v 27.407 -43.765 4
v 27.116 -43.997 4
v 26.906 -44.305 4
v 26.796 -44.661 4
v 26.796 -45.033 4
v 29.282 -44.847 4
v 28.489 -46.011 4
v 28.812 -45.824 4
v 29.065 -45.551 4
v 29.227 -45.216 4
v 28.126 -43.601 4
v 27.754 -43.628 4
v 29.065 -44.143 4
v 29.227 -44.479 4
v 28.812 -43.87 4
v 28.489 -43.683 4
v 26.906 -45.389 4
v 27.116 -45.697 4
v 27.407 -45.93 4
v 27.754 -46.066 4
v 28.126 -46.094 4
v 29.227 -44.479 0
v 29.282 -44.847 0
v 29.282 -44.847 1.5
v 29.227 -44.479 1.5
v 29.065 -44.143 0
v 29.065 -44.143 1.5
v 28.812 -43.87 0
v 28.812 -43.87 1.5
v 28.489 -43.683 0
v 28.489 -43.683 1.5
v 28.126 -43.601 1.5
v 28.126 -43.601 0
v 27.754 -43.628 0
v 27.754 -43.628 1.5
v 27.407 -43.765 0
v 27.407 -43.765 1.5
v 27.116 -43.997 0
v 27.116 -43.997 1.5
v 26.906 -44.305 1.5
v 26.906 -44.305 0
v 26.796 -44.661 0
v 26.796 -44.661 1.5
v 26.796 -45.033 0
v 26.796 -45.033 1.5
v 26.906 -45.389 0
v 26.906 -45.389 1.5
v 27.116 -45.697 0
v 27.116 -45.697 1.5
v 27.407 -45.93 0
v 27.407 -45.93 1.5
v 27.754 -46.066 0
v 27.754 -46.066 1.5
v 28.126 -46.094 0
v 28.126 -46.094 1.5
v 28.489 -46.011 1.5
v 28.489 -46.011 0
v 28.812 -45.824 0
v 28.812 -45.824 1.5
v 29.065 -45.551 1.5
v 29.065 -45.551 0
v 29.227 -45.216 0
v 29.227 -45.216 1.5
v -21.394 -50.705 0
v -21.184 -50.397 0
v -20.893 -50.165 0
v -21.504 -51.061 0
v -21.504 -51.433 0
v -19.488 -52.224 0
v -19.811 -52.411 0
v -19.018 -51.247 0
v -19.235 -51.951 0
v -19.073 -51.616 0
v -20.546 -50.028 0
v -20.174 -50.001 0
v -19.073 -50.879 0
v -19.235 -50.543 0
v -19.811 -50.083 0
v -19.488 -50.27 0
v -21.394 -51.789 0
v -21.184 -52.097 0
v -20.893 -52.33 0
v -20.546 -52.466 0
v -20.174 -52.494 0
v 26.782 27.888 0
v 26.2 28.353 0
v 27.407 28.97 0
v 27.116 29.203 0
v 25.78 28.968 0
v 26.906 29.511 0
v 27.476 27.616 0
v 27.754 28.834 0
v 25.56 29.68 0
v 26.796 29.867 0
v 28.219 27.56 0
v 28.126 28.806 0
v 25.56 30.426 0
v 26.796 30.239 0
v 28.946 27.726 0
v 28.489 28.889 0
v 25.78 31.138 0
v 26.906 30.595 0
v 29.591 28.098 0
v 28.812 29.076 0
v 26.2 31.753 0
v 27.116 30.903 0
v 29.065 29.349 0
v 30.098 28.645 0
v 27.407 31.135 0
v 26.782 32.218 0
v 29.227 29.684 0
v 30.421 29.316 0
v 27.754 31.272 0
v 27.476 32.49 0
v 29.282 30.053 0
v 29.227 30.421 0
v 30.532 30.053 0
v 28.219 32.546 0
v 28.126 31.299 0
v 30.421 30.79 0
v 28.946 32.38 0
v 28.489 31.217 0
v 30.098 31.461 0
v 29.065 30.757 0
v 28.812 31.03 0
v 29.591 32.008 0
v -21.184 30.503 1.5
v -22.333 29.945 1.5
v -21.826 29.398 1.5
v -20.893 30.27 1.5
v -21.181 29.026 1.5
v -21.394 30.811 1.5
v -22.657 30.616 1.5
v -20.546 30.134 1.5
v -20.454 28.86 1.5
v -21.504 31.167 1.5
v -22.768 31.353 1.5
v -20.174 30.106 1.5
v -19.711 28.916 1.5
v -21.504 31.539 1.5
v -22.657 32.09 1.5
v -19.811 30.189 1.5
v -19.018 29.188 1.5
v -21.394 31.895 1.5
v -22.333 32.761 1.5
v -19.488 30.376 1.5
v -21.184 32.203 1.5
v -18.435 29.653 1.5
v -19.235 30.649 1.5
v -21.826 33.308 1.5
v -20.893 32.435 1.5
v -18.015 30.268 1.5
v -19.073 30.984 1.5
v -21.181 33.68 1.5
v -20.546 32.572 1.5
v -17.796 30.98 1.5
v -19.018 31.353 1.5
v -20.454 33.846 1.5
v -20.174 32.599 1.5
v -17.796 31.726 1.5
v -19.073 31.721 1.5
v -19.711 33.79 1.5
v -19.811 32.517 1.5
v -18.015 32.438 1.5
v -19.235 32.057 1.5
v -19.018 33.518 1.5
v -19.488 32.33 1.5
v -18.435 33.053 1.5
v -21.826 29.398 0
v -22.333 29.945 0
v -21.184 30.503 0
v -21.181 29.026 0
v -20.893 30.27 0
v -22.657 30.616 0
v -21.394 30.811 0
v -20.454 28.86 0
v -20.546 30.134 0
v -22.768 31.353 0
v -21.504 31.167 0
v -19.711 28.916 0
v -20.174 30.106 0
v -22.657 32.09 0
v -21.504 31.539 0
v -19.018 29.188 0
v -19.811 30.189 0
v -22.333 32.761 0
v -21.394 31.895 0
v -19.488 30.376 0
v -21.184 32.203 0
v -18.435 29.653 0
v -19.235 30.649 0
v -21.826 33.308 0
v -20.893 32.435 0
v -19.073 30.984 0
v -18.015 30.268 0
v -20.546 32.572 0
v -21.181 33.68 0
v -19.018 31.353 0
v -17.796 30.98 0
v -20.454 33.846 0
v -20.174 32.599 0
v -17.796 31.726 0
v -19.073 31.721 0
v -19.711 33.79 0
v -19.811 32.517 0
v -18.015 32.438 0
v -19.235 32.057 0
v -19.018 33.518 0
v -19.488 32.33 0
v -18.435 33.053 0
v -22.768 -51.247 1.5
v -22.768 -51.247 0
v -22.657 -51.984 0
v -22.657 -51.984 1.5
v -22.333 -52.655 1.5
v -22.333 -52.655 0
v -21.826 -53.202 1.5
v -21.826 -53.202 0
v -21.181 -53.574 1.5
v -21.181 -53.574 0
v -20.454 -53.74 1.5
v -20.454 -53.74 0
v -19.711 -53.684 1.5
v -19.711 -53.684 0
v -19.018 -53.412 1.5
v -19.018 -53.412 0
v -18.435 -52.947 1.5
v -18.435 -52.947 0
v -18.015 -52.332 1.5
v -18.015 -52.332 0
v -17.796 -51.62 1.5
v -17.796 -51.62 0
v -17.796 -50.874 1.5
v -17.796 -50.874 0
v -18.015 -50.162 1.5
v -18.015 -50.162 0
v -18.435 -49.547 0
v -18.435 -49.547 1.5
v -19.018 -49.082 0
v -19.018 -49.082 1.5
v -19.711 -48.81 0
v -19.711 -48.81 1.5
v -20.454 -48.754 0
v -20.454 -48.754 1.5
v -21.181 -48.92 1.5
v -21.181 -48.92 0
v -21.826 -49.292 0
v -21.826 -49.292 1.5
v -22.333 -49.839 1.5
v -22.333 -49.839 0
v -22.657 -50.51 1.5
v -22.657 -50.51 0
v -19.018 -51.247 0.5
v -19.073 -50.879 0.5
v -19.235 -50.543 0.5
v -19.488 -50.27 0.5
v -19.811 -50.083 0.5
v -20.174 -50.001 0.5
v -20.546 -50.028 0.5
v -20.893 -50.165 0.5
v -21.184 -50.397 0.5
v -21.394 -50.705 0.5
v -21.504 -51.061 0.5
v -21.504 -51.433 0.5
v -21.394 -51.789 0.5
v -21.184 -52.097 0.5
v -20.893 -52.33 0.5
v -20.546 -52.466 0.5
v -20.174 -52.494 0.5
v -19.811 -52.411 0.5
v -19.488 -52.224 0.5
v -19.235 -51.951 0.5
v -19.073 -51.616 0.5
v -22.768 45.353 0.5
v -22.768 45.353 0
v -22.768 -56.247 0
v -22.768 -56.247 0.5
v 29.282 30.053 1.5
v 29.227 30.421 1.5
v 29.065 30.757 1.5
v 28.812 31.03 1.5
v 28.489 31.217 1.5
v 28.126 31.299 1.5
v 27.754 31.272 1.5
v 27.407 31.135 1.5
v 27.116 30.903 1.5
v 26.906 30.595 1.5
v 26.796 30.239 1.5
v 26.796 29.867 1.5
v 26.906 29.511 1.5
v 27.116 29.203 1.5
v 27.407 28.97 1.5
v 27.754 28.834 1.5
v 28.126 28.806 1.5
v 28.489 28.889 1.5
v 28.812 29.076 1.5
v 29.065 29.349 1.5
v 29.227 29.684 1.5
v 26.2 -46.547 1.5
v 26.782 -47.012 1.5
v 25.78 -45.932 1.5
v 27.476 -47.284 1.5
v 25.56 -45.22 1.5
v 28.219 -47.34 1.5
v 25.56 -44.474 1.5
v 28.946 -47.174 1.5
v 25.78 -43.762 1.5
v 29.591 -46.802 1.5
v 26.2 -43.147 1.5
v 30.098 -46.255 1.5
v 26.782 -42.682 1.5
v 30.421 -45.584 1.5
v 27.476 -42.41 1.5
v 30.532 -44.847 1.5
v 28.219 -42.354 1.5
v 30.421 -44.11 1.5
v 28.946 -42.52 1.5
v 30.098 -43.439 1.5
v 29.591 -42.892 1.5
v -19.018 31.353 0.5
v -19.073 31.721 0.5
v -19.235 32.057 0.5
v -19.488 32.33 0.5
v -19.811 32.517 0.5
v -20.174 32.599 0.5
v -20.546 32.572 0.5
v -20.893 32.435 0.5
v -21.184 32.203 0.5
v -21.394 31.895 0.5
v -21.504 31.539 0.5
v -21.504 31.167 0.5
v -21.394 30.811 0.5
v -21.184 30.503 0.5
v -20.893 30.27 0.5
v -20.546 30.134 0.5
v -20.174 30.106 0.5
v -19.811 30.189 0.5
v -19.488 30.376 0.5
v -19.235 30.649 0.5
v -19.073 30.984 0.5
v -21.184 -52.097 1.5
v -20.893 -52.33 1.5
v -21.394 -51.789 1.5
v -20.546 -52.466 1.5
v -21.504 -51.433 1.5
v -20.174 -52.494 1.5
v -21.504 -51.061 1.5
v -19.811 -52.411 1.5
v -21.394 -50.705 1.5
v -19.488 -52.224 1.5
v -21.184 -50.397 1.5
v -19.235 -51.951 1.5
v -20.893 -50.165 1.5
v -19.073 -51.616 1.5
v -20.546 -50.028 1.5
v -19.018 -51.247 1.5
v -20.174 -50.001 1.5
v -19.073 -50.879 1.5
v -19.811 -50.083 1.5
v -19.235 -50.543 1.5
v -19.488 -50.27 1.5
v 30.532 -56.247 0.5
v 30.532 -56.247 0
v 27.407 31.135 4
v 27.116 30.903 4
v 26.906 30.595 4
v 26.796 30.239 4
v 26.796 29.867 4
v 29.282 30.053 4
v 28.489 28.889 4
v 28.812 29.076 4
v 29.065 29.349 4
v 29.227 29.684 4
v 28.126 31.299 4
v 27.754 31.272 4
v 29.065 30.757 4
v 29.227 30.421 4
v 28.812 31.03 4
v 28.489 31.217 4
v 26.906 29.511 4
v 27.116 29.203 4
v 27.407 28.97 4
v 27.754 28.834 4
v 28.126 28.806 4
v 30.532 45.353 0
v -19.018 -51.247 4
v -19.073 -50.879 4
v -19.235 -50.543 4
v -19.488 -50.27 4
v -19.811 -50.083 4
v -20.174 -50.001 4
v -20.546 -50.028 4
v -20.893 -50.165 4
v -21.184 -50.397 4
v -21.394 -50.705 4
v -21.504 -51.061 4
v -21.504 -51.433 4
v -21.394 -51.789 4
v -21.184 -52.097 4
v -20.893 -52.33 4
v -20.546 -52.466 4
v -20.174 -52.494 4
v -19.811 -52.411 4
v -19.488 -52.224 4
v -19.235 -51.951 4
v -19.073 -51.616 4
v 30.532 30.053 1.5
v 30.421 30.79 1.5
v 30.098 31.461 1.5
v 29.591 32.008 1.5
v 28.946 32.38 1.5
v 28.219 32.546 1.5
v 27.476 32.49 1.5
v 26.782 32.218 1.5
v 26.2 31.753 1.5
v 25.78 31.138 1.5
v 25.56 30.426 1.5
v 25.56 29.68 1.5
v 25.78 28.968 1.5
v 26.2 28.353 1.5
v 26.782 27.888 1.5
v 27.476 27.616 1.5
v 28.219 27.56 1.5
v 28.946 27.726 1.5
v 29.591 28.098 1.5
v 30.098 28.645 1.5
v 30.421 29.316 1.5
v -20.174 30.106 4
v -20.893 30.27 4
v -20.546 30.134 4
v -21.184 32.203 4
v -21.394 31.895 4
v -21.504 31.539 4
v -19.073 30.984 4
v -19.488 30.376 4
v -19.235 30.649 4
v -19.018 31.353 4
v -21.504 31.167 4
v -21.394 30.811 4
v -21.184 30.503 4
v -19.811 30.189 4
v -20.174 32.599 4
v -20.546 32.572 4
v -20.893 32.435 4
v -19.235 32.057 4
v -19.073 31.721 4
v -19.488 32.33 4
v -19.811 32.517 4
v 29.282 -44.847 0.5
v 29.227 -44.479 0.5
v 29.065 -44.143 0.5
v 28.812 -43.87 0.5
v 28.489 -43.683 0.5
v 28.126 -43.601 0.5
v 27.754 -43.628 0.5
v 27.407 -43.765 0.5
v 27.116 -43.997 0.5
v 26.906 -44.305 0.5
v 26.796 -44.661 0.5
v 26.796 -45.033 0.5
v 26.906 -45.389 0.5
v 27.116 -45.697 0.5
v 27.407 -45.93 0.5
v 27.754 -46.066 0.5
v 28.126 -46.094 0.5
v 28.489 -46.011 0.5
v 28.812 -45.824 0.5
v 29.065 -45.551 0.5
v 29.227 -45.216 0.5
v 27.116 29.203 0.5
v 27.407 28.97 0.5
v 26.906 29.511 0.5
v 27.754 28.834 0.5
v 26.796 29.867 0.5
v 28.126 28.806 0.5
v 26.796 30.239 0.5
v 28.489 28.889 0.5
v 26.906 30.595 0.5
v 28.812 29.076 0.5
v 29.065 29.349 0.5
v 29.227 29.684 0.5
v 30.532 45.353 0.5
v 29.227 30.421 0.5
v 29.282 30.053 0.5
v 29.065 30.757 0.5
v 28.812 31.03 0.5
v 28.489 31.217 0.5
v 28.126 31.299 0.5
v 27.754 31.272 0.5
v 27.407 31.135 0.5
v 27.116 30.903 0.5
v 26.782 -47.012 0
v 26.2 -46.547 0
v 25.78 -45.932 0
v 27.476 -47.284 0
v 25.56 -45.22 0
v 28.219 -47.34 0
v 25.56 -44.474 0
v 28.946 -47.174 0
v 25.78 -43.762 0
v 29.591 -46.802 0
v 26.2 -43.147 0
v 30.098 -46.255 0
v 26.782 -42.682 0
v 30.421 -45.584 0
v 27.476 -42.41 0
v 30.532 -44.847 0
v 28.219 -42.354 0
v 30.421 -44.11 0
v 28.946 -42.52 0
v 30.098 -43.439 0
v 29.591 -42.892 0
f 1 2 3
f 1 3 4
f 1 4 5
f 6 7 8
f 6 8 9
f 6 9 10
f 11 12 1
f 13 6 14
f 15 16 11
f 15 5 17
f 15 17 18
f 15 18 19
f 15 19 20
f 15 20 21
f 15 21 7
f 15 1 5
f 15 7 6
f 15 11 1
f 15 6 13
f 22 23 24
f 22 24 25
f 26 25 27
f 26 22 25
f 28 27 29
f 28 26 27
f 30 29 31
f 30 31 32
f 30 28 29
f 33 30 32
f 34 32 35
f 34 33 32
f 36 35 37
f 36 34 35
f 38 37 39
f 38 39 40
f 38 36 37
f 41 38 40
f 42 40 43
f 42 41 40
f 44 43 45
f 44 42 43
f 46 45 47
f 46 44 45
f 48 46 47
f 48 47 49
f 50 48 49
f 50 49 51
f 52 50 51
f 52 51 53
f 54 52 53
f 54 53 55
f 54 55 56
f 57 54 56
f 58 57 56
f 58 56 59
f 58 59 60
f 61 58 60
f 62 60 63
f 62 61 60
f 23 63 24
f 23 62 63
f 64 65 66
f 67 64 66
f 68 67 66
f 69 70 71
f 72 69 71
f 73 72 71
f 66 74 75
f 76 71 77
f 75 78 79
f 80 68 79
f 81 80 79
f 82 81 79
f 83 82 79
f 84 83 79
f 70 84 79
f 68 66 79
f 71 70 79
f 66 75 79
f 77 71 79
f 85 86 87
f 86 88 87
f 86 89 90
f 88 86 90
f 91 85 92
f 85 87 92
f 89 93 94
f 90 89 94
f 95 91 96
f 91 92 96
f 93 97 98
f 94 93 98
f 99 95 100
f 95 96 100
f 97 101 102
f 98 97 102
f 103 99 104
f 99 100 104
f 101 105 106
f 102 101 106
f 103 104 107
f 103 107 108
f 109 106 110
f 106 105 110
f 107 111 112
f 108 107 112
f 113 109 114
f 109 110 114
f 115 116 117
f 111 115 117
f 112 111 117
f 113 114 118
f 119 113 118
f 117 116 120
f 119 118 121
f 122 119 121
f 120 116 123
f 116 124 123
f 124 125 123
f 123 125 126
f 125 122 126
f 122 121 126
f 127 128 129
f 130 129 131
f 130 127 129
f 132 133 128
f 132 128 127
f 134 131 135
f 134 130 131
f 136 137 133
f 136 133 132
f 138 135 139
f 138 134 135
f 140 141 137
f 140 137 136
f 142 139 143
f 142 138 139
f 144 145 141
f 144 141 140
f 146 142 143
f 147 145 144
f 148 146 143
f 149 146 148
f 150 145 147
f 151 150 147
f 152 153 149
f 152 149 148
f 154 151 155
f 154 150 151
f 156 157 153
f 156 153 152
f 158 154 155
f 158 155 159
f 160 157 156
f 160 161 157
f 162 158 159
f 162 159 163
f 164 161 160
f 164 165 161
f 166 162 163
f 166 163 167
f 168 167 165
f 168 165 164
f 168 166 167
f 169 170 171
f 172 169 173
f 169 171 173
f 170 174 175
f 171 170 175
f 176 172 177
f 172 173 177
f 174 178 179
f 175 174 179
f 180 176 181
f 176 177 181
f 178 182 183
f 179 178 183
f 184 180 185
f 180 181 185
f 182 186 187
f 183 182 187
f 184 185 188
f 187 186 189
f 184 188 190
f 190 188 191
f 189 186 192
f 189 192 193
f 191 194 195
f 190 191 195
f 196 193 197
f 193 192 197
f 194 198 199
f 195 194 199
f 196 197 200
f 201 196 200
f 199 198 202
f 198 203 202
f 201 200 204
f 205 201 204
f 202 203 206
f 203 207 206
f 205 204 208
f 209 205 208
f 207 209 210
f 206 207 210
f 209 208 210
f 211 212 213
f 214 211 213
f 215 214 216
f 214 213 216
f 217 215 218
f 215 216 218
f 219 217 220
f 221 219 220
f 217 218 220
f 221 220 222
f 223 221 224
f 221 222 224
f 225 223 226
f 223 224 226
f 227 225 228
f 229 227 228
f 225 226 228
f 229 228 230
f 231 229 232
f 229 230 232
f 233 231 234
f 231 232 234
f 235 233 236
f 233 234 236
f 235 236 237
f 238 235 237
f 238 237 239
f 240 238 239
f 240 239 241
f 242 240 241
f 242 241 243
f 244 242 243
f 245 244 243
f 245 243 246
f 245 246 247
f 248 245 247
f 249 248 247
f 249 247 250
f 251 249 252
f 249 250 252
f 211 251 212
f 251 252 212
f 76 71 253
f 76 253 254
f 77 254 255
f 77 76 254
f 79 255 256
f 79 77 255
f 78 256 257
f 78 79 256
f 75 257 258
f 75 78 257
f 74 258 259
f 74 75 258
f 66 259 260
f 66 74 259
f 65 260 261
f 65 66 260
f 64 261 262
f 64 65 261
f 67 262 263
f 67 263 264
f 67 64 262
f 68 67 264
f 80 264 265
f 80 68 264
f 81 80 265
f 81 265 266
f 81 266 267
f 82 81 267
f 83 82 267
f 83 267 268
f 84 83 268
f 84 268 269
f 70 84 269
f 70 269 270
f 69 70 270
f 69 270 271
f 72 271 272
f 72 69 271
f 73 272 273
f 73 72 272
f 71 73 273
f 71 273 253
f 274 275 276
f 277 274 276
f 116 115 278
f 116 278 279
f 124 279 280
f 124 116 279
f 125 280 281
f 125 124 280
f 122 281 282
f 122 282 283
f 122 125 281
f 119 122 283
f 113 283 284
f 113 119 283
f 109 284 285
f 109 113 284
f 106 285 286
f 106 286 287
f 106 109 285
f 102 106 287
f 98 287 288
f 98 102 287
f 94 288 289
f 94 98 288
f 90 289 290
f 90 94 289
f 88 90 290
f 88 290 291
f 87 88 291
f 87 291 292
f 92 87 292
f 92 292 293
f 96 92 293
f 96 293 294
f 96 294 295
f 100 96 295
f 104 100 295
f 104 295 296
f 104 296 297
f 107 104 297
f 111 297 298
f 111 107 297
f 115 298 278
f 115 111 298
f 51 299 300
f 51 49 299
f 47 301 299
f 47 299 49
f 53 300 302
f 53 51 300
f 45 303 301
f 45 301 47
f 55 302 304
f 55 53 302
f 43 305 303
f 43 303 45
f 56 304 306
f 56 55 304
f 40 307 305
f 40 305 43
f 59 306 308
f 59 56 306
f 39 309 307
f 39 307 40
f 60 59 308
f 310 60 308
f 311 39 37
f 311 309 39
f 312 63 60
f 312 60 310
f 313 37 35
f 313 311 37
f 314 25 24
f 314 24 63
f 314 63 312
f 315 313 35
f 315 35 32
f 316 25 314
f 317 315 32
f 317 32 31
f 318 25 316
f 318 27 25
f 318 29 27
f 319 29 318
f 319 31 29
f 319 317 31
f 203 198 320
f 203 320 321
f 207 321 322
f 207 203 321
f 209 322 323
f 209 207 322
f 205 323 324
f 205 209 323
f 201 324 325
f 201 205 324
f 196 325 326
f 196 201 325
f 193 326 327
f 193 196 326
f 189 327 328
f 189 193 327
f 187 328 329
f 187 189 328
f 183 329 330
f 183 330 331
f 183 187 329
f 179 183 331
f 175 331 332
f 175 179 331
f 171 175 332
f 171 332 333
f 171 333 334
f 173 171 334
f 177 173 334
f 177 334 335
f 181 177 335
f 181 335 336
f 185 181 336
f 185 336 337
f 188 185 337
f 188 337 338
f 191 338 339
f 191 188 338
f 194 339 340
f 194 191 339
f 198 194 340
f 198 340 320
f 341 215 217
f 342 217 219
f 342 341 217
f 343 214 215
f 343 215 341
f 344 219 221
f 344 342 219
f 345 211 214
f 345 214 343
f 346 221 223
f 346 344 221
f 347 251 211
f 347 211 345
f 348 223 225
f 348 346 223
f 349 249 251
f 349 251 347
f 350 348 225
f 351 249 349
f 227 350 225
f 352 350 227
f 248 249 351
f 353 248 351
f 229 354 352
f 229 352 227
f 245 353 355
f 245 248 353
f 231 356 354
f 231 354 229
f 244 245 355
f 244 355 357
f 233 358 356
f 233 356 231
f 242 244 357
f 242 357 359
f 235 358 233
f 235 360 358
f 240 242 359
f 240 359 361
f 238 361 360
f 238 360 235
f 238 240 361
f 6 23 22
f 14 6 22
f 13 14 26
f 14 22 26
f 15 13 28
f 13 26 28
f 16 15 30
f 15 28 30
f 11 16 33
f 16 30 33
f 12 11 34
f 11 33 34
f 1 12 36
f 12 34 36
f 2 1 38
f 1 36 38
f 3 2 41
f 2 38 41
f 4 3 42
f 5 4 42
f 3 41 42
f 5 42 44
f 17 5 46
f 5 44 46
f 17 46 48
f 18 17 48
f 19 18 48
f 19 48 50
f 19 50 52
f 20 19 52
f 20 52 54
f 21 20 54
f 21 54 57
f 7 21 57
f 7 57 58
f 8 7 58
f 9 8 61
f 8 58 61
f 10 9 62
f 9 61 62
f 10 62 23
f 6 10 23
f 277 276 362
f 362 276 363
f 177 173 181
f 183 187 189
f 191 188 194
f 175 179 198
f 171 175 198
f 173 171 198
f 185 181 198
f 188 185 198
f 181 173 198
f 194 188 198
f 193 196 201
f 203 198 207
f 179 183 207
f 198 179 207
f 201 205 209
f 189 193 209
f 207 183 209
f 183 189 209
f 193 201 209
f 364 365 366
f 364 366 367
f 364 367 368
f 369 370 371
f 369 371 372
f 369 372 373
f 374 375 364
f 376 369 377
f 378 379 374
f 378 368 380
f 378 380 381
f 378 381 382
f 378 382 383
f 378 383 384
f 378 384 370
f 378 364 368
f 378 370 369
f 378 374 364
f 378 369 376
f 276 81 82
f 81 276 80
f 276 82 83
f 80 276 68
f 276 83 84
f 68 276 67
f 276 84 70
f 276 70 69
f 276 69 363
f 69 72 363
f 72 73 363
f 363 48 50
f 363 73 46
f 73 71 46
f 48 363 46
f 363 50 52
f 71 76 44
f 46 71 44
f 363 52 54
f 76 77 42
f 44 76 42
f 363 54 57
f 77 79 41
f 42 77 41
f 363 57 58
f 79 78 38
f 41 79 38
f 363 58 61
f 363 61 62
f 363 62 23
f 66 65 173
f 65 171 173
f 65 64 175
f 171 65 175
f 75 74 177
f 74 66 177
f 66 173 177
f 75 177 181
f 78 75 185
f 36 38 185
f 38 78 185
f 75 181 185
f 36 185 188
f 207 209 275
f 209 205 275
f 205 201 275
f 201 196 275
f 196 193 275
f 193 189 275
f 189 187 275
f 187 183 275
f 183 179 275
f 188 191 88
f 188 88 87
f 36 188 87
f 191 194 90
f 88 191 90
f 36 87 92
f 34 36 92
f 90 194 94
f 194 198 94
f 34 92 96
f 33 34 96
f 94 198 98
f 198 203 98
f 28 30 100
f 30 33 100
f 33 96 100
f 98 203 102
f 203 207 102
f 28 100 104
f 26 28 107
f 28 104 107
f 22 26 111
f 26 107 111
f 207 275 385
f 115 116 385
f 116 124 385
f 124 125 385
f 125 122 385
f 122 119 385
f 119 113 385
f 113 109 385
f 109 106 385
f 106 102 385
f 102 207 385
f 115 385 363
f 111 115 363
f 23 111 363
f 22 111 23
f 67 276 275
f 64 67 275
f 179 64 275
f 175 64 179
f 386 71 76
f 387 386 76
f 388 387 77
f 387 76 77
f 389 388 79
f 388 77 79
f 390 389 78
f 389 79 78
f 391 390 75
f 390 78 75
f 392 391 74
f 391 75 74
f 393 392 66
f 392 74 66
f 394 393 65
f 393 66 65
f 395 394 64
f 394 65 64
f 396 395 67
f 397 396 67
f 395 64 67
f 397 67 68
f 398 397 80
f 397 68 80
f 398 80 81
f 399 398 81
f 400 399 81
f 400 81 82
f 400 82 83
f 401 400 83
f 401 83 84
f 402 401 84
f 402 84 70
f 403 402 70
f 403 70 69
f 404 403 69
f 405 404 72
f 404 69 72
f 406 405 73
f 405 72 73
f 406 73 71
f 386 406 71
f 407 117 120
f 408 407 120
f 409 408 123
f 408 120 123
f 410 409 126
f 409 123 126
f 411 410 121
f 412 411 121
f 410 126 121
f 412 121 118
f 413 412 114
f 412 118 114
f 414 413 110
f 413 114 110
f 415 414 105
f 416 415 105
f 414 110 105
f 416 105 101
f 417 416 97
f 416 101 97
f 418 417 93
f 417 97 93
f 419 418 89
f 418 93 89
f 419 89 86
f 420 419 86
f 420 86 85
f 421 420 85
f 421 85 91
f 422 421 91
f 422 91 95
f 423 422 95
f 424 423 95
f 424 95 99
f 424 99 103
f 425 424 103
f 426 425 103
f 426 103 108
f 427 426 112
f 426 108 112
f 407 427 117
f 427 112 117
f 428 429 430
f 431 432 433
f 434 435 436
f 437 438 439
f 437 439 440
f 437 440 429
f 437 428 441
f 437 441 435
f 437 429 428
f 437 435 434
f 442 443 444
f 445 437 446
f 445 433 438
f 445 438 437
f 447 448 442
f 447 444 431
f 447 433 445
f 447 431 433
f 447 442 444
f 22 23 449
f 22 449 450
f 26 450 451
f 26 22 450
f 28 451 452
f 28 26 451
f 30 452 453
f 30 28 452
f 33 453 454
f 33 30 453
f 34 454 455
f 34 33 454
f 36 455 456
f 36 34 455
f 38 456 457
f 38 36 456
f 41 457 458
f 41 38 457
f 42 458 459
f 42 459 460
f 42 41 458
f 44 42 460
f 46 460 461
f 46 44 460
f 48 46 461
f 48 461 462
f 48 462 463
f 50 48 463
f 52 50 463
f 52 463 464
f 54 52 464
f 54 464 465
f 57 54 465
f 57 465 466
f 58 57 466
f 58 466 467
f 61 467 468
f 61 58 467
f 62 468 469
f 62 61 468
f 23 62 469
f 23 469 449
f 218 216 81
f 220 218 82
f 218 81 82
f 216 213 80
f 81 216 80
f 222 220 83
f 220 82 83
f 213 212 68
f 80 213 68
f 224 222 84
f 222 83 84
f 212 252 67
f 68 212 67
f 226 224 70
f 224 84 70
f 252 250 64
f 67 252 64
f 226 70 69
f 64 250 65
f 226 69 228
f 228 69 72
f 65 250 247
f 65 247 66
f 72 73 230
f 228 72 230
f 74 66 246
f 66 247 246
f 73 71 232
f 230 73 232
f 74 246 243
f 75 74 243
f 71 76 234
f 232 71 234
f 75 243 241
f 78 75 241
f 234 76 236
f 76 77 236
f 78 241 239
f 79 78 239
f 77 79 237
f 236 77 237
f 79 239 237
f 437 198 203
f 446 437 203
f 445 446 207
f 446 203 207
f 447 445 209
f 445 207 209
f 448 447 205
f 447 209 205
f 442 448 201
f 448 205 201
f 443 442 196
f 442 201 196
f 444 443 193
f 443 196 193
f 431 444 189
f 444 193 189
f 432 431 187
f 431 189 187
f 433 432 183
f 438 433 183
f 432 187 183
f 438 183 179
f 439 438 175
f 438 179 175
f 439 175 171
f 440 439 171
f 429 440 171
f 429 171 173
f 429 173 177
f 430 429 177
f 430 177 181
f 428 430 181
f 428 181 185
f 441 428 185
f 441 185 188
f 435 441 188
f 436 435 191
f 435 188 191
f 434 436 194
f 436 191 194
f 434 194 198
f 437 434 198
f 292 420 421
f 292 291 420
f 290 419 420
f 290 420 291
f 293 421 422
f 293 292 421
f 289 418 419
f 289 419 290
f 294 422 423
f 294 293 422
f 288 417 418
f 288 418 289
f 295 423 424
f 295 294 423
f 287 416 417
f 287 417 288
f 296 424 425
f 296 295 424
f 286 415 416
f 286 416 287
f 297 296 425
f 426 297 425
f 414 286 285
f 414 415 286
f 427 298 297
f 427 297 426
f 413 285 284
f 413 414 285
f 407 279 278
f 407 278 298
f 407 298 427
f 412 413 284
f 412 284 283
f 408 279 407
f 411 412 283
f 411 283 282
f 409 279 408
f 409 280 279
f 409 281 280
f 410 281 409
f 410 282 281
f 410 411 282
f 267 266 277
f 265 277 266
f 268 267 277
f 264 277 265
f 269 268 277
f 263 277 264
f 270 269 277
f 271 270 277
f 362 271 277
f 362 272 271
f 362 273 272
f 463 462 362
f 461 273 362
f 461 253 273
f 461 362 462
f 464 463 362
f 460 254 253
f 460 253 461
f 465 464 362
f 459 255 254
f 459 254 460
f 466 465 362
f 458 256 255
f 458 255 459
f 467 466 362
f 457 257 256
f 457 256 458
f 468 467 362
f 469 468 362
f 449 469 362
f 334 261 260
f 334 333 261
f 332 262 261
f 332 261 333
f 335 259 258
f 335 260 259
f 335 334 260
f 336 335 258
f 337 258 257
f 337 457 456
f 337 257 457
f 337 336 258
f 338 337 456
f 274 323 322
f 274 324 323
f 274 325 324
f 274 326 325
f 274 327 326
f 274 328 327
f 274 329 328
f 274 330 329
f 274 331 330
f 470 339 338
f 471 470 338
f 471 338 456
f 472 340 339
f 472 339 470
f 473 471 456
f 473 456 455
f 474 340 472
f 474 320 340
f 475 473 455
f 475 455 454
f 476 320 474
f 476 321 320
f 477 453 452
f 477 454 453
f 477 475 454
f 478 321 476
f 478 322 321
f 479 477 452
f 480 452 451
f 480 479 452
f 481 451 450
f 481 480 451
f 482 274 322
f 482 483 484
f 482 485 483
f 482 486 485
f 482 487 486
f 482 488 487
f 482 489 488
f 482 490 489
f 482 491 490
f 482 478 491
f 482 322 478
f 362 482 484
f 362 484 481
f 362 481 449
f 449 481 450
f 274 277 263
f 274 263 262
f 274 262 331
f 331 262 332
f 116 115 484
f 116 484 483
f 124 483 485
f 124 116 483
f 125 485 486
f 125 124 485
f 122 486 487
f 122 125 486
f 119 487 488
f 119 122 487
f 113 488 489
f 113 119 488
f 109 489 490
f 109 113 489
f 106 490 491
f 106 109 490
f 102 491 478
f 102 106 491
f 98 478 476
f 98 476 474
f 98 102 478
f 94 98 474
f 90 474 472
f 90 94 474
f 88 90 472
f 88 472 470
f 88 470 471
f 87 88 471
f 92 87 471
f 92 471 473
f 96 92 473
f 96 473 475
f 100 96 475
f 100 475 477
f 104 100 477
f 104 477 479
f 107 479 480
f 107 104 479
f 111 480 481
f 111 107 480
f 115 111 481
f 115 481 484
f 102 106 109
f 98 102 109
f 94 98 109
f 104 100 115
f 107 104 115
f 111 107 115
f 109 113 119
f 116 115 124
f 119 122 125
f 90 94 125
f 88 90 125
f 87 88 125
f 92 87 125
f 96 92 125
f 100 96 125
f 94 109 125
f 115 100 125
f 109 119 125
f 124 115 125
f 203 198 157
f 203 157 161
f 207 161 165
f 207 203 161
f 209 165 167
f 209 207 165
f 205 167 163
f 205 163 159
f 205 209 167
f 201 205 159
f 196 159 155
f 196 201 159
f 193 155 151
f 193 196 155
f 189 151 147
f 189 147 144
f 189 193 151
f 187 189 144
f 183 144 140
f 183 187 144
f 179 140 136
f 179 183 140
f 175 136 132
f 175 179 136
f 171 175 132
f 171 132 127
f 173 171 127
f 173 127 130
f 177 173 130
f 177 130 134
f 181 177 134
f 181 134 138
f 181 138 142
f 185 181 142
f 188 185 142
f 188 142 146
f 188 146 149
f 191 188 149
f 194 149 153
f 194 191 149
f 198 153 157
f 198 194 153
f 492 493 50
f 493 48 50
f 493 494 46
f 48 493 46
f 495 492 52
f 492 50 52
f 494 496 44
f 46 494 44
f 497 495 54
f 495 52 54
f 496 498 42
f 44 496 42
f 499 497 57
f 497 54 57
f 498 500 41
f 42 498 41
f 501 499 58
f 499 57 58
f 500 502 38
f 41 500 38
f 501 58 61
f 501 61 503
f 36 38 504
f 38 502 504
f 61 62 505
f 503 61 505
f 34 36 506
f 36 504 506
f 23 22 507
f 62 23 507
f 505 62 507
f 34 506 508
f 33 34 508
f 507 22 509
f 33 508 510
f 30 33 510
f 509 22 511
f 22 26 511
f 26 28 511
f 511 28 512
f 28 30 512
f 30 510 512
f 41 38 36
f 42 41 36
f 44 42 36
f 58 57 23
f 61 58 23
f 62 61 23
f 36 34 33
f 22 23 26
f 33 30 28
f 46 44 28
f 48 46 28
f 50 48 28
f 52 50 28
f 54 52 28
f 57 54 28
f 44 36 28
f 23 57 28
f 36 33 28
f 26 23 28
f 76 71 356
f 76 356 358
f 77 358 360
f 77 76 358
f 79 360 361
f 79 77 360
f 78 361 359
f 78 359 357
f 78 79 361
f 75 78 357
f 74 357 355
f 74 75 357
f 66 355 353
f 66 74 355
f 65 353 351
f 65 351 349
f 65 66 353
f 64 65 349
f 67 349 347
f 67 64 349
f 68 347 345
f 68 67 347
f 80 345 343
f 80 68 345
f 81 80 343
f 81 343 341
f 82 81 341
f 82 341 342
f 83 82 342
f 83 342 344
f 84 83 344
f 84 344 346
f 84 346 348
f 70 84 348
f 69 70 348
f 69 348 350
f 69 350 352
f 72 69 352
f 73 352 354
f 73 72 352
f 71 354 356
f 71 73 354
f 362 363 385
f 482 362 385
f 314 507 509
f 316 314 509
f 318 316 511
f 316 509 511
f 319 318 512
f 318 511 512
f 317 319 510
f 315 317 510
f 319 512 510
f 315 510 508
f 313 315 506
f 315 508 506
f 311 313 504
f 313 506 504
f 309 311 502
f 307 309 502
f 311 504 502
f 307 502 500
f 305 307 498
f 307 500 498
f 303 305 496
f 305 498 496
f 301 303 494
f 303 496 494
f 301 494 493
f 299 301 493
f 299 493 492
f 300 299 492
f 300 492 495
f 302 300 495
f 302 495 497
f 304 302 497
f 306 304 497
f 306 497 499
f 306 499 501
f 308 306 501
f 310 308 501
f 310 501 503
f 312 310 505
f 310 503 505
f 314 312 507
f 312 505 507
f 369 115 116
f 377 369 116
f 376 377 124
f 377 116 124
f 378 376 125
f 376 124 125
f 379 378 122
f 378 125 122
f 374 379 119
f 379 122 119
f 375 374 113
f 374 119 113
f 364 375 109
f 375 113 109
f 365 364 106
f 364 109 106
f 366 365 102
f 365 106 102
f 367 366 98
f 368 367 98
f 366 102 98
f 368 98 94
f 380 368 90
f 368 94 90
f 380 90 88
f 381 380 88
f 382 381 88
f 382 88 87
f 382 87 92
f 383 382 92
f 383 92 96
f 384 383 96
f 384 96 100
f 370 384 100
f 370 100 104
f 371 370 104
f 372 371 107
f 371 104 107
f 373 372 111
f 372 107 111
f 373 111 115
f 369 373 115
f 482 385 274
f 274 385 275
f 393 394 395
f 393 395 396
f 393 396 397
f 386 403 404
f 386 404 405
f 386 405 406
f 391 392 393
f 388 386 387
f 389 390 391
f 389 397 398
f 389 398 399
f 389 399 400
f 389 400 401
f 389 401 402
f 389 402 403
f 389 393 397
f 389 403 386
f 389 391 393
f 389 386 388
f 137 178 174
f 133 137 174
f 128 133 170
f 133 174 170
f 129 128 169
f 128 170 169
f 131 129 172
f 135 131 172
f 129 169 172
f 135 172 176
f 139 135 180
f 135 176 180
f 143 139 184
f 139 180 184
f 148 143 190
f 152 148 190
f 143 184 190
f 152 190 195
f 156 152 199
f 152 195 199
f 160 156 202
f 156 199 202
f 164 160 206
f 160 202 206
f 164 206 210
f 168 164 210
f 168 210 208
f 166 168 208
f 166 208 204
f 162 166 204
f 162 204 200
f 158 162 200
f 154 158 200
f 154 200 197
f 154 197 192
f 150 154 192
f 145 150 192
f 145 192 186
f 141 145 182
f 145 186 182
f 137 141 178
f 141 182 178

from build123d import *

# Parameters (mm, degrees)
F0_R     = 1.25
F1_DEPTH = 1.5
F0_R_2   = 2.5
F2_DEPTH = 0.5
F3_DEPTH = 4


with BuildPart() as f1:
    # F0 (on Top) → F1 (new body)
    with BuildSketch(Plane.XY):
        with BuildLine():
            ThreePointArc((-17.7676470588, 31.3529411765), (-20.2676470588, 33.8529411765), (-22.7676470588, 31.3529411765))
            ThreePointArc((-22.7676470588, 31.3529411765), (-20.2676470588, 28.8529411765), (-17.7676470588, 31.3529411765))
        make_face()
        with Locations((-20.2676470588, 31.3529411765)):
            Circle(F0_R, mode=Mode.SUBTRACT)
    extrude(amount=F1_DEPTH)


with BuildPart() as f1b:
    # F0 (on Top) → F1, piece 2 (new body)
    with BuildSketch(Plane.XY):
        with Locations((28.0323529412, 30.0529411765)):
            Circle(F0_R_2)
        with Locations((28.0323529412, 30.0529411765)):
            Circle(F0_R, mode=Mode.SUBTRACT)
    extrude(amount=F1_DEPTH)


with BuildPart() as f1c:
    # F0 (on Top) → F1, piece 3 (new body)
    with BuildSketch(Plane.XY):
        with BuildLine():
            ThreePointArc((-17.7676470588, -51.2470588235), (-20.2676470588, -48.7470588235), (-22.7676470588, -51.2470588235))
            ThreePointArc((-22.7676470588, -51.2470588235), (-20.2676470588, -53.7470588235), (-17.7676470588, -51.2470588235))
        make_face()
        with Locations((-20.2676470588, -51.2470588235)):
            Circle(F0_R, mode=Mode.SUBTRACT)
    extrude(amount=F1_DEPTH)


with BuildPart() as f1d:
    # F0 (on Top) → F1, piece 4 (new body)
    with BuildSketch(Plane.XY):
        with Locations((28.0323529412, -44.8470588235)):
            Circle(F0_R_2)
        with Locations((28.0323529412, -44.8470588235)):
            Circle(F0_R, mode=Mode.SUBTRACT)
    extrude(amount=F1_DEPTH)


with BuildPart() as f2:
    # F0 (on Top) → F2 (new body)
    with BuildSketch(Plane.XY):
        Polygon((30.5323529412, 45.3529411765), (-22.7676470588, 45.3529411765), (-22.7676470588, 31.3529411765), (-22.7676470588, -51.2470588235), (-22.7676470588, -56.2470588235), (30.5323529412, -56.2470588235), (30.5323529412, -44.8470588235), (30.5323529412, 30.0529411765), align=None)
        with BuildLine():
            ThreePointArc((-17.7676470588, -51.2470588235), (-20.2676470588, -53.7470588235), (-22.7676470588, -51.2470588235))
            ThreePointArc((-22.7676470588, -51.2470588235), (-20.2676470588, -48.7470588235), (-17.7676470588, -51.2470588235))
        make_face(mode=Mode.SUBTRACT)
        with Locations((28.0323529412, -44.8470588235)):
            Circle(F0_R_2, mode=Mode.SUBTRACT)
        with BuildLine():
            ThreePointArc((-17.7676470588, 31.3529411765), (-20.2676470588, 28.8529411765), (-22.7676470588, 31.3529411765))
            ThreePointArc((-22.7676470588, 31.3529411765), (-20.2676470588, 33.8529411765), (-17.7676470588, 31.3529411765))
        make_face(mode=Mode.SUBTRACT)
        with Locations((28.0323529412, 30.0529411765)):
            Circle(F0_R_2, mode=Mode.SUBTRACT)
        with BuildLine():
            ThreePointArc((-17.7676470588, 31.3529411765), (-20.2676470588, 33.8529411765), (-22.7676470588, 31.3529411765))
            ThreePointArc((-22.7676470588, 31.3529411765), (-20.2676470588, 28.8529411765), (-17.7676470588, 31.3529411765))
        make_face()
        with Locations((-20.2676470588, 31.3529411765)):
            Circle(F0_R, mode=Mode.SUBTRACT)
        with BuildLine():
            ThreePointArc((-17.7676470588, -51.2470588235), (-20.2676470588, -48.7470588235), (-22.7676470588, -51.2470588235))
            ThreePointArc((-22.7676470588, -51.2470588235), (-20.2676470588, -53.7470588235), (-17.7676470588, -51.2470588235))
        make_face()
        with Locations((-20.2676470588, -51.2470588235)):
            Circle(F0_R, mode=Mode.SUBTRACT)
        with Locations((28.0323529412, -44.8470588235)):
            Circle(F0_R_2)
        with Locations((28.0323529412, -44.8470588235)):
            Circle(F0_R, mode=Mode.SUBTRACT)
        with Locations((28.0323529412, 30.0529411765)):
            Circle(F0_R_2)
        with Locations((28.0323529412, 30.0529411765)):
            Circle(F0_R, mode=Mode.SUBTRACT)
    extrude(amount=F2_DEPTH)


with BuildPart() as f3:
    # F0 (on Top) → F3 (new body)
    with BuildSketch(Plane.XY):
        with Locations((-20.2676470588, 31.3529411765)):
            Circle(F0_R)
    extrude(amount=F3_DEPTH)


with BuildPart() as f3b:
    # F0 (on Top) → F3, piece 2 (new body)
    with BuildSketch(Plane.XY):
        with Locations((28.0323529412, 30.0529411765)):
            Circle(F0_R)
    extrude(amount=F3_DEPTH)


with BuildPart() as f3c:
    # F0 (on Top) → F3, piece 3 (new body)
    with BuildSketch(Plane.XY):
        with Locations((-20.2676470588, -51.2470588235)):
            Circle(F0_R)
    extrude(amount=F3_DEPTH)


with BuildPart() as f3d:
    # F0 (on Top) → F3, piece 4 (new body)
    with BuildSketch(Plane.XY):
        with Locations((28.0323529412, -44.8470588235)):
            Circle(F0_R)
    extrude(amount=F3_DEPTH)


solid = Compound([f1.part, f1b.part, f1c.part, f1d.part, f2.part, f3.part, f3b.part, f3c.part, f3d.part])
